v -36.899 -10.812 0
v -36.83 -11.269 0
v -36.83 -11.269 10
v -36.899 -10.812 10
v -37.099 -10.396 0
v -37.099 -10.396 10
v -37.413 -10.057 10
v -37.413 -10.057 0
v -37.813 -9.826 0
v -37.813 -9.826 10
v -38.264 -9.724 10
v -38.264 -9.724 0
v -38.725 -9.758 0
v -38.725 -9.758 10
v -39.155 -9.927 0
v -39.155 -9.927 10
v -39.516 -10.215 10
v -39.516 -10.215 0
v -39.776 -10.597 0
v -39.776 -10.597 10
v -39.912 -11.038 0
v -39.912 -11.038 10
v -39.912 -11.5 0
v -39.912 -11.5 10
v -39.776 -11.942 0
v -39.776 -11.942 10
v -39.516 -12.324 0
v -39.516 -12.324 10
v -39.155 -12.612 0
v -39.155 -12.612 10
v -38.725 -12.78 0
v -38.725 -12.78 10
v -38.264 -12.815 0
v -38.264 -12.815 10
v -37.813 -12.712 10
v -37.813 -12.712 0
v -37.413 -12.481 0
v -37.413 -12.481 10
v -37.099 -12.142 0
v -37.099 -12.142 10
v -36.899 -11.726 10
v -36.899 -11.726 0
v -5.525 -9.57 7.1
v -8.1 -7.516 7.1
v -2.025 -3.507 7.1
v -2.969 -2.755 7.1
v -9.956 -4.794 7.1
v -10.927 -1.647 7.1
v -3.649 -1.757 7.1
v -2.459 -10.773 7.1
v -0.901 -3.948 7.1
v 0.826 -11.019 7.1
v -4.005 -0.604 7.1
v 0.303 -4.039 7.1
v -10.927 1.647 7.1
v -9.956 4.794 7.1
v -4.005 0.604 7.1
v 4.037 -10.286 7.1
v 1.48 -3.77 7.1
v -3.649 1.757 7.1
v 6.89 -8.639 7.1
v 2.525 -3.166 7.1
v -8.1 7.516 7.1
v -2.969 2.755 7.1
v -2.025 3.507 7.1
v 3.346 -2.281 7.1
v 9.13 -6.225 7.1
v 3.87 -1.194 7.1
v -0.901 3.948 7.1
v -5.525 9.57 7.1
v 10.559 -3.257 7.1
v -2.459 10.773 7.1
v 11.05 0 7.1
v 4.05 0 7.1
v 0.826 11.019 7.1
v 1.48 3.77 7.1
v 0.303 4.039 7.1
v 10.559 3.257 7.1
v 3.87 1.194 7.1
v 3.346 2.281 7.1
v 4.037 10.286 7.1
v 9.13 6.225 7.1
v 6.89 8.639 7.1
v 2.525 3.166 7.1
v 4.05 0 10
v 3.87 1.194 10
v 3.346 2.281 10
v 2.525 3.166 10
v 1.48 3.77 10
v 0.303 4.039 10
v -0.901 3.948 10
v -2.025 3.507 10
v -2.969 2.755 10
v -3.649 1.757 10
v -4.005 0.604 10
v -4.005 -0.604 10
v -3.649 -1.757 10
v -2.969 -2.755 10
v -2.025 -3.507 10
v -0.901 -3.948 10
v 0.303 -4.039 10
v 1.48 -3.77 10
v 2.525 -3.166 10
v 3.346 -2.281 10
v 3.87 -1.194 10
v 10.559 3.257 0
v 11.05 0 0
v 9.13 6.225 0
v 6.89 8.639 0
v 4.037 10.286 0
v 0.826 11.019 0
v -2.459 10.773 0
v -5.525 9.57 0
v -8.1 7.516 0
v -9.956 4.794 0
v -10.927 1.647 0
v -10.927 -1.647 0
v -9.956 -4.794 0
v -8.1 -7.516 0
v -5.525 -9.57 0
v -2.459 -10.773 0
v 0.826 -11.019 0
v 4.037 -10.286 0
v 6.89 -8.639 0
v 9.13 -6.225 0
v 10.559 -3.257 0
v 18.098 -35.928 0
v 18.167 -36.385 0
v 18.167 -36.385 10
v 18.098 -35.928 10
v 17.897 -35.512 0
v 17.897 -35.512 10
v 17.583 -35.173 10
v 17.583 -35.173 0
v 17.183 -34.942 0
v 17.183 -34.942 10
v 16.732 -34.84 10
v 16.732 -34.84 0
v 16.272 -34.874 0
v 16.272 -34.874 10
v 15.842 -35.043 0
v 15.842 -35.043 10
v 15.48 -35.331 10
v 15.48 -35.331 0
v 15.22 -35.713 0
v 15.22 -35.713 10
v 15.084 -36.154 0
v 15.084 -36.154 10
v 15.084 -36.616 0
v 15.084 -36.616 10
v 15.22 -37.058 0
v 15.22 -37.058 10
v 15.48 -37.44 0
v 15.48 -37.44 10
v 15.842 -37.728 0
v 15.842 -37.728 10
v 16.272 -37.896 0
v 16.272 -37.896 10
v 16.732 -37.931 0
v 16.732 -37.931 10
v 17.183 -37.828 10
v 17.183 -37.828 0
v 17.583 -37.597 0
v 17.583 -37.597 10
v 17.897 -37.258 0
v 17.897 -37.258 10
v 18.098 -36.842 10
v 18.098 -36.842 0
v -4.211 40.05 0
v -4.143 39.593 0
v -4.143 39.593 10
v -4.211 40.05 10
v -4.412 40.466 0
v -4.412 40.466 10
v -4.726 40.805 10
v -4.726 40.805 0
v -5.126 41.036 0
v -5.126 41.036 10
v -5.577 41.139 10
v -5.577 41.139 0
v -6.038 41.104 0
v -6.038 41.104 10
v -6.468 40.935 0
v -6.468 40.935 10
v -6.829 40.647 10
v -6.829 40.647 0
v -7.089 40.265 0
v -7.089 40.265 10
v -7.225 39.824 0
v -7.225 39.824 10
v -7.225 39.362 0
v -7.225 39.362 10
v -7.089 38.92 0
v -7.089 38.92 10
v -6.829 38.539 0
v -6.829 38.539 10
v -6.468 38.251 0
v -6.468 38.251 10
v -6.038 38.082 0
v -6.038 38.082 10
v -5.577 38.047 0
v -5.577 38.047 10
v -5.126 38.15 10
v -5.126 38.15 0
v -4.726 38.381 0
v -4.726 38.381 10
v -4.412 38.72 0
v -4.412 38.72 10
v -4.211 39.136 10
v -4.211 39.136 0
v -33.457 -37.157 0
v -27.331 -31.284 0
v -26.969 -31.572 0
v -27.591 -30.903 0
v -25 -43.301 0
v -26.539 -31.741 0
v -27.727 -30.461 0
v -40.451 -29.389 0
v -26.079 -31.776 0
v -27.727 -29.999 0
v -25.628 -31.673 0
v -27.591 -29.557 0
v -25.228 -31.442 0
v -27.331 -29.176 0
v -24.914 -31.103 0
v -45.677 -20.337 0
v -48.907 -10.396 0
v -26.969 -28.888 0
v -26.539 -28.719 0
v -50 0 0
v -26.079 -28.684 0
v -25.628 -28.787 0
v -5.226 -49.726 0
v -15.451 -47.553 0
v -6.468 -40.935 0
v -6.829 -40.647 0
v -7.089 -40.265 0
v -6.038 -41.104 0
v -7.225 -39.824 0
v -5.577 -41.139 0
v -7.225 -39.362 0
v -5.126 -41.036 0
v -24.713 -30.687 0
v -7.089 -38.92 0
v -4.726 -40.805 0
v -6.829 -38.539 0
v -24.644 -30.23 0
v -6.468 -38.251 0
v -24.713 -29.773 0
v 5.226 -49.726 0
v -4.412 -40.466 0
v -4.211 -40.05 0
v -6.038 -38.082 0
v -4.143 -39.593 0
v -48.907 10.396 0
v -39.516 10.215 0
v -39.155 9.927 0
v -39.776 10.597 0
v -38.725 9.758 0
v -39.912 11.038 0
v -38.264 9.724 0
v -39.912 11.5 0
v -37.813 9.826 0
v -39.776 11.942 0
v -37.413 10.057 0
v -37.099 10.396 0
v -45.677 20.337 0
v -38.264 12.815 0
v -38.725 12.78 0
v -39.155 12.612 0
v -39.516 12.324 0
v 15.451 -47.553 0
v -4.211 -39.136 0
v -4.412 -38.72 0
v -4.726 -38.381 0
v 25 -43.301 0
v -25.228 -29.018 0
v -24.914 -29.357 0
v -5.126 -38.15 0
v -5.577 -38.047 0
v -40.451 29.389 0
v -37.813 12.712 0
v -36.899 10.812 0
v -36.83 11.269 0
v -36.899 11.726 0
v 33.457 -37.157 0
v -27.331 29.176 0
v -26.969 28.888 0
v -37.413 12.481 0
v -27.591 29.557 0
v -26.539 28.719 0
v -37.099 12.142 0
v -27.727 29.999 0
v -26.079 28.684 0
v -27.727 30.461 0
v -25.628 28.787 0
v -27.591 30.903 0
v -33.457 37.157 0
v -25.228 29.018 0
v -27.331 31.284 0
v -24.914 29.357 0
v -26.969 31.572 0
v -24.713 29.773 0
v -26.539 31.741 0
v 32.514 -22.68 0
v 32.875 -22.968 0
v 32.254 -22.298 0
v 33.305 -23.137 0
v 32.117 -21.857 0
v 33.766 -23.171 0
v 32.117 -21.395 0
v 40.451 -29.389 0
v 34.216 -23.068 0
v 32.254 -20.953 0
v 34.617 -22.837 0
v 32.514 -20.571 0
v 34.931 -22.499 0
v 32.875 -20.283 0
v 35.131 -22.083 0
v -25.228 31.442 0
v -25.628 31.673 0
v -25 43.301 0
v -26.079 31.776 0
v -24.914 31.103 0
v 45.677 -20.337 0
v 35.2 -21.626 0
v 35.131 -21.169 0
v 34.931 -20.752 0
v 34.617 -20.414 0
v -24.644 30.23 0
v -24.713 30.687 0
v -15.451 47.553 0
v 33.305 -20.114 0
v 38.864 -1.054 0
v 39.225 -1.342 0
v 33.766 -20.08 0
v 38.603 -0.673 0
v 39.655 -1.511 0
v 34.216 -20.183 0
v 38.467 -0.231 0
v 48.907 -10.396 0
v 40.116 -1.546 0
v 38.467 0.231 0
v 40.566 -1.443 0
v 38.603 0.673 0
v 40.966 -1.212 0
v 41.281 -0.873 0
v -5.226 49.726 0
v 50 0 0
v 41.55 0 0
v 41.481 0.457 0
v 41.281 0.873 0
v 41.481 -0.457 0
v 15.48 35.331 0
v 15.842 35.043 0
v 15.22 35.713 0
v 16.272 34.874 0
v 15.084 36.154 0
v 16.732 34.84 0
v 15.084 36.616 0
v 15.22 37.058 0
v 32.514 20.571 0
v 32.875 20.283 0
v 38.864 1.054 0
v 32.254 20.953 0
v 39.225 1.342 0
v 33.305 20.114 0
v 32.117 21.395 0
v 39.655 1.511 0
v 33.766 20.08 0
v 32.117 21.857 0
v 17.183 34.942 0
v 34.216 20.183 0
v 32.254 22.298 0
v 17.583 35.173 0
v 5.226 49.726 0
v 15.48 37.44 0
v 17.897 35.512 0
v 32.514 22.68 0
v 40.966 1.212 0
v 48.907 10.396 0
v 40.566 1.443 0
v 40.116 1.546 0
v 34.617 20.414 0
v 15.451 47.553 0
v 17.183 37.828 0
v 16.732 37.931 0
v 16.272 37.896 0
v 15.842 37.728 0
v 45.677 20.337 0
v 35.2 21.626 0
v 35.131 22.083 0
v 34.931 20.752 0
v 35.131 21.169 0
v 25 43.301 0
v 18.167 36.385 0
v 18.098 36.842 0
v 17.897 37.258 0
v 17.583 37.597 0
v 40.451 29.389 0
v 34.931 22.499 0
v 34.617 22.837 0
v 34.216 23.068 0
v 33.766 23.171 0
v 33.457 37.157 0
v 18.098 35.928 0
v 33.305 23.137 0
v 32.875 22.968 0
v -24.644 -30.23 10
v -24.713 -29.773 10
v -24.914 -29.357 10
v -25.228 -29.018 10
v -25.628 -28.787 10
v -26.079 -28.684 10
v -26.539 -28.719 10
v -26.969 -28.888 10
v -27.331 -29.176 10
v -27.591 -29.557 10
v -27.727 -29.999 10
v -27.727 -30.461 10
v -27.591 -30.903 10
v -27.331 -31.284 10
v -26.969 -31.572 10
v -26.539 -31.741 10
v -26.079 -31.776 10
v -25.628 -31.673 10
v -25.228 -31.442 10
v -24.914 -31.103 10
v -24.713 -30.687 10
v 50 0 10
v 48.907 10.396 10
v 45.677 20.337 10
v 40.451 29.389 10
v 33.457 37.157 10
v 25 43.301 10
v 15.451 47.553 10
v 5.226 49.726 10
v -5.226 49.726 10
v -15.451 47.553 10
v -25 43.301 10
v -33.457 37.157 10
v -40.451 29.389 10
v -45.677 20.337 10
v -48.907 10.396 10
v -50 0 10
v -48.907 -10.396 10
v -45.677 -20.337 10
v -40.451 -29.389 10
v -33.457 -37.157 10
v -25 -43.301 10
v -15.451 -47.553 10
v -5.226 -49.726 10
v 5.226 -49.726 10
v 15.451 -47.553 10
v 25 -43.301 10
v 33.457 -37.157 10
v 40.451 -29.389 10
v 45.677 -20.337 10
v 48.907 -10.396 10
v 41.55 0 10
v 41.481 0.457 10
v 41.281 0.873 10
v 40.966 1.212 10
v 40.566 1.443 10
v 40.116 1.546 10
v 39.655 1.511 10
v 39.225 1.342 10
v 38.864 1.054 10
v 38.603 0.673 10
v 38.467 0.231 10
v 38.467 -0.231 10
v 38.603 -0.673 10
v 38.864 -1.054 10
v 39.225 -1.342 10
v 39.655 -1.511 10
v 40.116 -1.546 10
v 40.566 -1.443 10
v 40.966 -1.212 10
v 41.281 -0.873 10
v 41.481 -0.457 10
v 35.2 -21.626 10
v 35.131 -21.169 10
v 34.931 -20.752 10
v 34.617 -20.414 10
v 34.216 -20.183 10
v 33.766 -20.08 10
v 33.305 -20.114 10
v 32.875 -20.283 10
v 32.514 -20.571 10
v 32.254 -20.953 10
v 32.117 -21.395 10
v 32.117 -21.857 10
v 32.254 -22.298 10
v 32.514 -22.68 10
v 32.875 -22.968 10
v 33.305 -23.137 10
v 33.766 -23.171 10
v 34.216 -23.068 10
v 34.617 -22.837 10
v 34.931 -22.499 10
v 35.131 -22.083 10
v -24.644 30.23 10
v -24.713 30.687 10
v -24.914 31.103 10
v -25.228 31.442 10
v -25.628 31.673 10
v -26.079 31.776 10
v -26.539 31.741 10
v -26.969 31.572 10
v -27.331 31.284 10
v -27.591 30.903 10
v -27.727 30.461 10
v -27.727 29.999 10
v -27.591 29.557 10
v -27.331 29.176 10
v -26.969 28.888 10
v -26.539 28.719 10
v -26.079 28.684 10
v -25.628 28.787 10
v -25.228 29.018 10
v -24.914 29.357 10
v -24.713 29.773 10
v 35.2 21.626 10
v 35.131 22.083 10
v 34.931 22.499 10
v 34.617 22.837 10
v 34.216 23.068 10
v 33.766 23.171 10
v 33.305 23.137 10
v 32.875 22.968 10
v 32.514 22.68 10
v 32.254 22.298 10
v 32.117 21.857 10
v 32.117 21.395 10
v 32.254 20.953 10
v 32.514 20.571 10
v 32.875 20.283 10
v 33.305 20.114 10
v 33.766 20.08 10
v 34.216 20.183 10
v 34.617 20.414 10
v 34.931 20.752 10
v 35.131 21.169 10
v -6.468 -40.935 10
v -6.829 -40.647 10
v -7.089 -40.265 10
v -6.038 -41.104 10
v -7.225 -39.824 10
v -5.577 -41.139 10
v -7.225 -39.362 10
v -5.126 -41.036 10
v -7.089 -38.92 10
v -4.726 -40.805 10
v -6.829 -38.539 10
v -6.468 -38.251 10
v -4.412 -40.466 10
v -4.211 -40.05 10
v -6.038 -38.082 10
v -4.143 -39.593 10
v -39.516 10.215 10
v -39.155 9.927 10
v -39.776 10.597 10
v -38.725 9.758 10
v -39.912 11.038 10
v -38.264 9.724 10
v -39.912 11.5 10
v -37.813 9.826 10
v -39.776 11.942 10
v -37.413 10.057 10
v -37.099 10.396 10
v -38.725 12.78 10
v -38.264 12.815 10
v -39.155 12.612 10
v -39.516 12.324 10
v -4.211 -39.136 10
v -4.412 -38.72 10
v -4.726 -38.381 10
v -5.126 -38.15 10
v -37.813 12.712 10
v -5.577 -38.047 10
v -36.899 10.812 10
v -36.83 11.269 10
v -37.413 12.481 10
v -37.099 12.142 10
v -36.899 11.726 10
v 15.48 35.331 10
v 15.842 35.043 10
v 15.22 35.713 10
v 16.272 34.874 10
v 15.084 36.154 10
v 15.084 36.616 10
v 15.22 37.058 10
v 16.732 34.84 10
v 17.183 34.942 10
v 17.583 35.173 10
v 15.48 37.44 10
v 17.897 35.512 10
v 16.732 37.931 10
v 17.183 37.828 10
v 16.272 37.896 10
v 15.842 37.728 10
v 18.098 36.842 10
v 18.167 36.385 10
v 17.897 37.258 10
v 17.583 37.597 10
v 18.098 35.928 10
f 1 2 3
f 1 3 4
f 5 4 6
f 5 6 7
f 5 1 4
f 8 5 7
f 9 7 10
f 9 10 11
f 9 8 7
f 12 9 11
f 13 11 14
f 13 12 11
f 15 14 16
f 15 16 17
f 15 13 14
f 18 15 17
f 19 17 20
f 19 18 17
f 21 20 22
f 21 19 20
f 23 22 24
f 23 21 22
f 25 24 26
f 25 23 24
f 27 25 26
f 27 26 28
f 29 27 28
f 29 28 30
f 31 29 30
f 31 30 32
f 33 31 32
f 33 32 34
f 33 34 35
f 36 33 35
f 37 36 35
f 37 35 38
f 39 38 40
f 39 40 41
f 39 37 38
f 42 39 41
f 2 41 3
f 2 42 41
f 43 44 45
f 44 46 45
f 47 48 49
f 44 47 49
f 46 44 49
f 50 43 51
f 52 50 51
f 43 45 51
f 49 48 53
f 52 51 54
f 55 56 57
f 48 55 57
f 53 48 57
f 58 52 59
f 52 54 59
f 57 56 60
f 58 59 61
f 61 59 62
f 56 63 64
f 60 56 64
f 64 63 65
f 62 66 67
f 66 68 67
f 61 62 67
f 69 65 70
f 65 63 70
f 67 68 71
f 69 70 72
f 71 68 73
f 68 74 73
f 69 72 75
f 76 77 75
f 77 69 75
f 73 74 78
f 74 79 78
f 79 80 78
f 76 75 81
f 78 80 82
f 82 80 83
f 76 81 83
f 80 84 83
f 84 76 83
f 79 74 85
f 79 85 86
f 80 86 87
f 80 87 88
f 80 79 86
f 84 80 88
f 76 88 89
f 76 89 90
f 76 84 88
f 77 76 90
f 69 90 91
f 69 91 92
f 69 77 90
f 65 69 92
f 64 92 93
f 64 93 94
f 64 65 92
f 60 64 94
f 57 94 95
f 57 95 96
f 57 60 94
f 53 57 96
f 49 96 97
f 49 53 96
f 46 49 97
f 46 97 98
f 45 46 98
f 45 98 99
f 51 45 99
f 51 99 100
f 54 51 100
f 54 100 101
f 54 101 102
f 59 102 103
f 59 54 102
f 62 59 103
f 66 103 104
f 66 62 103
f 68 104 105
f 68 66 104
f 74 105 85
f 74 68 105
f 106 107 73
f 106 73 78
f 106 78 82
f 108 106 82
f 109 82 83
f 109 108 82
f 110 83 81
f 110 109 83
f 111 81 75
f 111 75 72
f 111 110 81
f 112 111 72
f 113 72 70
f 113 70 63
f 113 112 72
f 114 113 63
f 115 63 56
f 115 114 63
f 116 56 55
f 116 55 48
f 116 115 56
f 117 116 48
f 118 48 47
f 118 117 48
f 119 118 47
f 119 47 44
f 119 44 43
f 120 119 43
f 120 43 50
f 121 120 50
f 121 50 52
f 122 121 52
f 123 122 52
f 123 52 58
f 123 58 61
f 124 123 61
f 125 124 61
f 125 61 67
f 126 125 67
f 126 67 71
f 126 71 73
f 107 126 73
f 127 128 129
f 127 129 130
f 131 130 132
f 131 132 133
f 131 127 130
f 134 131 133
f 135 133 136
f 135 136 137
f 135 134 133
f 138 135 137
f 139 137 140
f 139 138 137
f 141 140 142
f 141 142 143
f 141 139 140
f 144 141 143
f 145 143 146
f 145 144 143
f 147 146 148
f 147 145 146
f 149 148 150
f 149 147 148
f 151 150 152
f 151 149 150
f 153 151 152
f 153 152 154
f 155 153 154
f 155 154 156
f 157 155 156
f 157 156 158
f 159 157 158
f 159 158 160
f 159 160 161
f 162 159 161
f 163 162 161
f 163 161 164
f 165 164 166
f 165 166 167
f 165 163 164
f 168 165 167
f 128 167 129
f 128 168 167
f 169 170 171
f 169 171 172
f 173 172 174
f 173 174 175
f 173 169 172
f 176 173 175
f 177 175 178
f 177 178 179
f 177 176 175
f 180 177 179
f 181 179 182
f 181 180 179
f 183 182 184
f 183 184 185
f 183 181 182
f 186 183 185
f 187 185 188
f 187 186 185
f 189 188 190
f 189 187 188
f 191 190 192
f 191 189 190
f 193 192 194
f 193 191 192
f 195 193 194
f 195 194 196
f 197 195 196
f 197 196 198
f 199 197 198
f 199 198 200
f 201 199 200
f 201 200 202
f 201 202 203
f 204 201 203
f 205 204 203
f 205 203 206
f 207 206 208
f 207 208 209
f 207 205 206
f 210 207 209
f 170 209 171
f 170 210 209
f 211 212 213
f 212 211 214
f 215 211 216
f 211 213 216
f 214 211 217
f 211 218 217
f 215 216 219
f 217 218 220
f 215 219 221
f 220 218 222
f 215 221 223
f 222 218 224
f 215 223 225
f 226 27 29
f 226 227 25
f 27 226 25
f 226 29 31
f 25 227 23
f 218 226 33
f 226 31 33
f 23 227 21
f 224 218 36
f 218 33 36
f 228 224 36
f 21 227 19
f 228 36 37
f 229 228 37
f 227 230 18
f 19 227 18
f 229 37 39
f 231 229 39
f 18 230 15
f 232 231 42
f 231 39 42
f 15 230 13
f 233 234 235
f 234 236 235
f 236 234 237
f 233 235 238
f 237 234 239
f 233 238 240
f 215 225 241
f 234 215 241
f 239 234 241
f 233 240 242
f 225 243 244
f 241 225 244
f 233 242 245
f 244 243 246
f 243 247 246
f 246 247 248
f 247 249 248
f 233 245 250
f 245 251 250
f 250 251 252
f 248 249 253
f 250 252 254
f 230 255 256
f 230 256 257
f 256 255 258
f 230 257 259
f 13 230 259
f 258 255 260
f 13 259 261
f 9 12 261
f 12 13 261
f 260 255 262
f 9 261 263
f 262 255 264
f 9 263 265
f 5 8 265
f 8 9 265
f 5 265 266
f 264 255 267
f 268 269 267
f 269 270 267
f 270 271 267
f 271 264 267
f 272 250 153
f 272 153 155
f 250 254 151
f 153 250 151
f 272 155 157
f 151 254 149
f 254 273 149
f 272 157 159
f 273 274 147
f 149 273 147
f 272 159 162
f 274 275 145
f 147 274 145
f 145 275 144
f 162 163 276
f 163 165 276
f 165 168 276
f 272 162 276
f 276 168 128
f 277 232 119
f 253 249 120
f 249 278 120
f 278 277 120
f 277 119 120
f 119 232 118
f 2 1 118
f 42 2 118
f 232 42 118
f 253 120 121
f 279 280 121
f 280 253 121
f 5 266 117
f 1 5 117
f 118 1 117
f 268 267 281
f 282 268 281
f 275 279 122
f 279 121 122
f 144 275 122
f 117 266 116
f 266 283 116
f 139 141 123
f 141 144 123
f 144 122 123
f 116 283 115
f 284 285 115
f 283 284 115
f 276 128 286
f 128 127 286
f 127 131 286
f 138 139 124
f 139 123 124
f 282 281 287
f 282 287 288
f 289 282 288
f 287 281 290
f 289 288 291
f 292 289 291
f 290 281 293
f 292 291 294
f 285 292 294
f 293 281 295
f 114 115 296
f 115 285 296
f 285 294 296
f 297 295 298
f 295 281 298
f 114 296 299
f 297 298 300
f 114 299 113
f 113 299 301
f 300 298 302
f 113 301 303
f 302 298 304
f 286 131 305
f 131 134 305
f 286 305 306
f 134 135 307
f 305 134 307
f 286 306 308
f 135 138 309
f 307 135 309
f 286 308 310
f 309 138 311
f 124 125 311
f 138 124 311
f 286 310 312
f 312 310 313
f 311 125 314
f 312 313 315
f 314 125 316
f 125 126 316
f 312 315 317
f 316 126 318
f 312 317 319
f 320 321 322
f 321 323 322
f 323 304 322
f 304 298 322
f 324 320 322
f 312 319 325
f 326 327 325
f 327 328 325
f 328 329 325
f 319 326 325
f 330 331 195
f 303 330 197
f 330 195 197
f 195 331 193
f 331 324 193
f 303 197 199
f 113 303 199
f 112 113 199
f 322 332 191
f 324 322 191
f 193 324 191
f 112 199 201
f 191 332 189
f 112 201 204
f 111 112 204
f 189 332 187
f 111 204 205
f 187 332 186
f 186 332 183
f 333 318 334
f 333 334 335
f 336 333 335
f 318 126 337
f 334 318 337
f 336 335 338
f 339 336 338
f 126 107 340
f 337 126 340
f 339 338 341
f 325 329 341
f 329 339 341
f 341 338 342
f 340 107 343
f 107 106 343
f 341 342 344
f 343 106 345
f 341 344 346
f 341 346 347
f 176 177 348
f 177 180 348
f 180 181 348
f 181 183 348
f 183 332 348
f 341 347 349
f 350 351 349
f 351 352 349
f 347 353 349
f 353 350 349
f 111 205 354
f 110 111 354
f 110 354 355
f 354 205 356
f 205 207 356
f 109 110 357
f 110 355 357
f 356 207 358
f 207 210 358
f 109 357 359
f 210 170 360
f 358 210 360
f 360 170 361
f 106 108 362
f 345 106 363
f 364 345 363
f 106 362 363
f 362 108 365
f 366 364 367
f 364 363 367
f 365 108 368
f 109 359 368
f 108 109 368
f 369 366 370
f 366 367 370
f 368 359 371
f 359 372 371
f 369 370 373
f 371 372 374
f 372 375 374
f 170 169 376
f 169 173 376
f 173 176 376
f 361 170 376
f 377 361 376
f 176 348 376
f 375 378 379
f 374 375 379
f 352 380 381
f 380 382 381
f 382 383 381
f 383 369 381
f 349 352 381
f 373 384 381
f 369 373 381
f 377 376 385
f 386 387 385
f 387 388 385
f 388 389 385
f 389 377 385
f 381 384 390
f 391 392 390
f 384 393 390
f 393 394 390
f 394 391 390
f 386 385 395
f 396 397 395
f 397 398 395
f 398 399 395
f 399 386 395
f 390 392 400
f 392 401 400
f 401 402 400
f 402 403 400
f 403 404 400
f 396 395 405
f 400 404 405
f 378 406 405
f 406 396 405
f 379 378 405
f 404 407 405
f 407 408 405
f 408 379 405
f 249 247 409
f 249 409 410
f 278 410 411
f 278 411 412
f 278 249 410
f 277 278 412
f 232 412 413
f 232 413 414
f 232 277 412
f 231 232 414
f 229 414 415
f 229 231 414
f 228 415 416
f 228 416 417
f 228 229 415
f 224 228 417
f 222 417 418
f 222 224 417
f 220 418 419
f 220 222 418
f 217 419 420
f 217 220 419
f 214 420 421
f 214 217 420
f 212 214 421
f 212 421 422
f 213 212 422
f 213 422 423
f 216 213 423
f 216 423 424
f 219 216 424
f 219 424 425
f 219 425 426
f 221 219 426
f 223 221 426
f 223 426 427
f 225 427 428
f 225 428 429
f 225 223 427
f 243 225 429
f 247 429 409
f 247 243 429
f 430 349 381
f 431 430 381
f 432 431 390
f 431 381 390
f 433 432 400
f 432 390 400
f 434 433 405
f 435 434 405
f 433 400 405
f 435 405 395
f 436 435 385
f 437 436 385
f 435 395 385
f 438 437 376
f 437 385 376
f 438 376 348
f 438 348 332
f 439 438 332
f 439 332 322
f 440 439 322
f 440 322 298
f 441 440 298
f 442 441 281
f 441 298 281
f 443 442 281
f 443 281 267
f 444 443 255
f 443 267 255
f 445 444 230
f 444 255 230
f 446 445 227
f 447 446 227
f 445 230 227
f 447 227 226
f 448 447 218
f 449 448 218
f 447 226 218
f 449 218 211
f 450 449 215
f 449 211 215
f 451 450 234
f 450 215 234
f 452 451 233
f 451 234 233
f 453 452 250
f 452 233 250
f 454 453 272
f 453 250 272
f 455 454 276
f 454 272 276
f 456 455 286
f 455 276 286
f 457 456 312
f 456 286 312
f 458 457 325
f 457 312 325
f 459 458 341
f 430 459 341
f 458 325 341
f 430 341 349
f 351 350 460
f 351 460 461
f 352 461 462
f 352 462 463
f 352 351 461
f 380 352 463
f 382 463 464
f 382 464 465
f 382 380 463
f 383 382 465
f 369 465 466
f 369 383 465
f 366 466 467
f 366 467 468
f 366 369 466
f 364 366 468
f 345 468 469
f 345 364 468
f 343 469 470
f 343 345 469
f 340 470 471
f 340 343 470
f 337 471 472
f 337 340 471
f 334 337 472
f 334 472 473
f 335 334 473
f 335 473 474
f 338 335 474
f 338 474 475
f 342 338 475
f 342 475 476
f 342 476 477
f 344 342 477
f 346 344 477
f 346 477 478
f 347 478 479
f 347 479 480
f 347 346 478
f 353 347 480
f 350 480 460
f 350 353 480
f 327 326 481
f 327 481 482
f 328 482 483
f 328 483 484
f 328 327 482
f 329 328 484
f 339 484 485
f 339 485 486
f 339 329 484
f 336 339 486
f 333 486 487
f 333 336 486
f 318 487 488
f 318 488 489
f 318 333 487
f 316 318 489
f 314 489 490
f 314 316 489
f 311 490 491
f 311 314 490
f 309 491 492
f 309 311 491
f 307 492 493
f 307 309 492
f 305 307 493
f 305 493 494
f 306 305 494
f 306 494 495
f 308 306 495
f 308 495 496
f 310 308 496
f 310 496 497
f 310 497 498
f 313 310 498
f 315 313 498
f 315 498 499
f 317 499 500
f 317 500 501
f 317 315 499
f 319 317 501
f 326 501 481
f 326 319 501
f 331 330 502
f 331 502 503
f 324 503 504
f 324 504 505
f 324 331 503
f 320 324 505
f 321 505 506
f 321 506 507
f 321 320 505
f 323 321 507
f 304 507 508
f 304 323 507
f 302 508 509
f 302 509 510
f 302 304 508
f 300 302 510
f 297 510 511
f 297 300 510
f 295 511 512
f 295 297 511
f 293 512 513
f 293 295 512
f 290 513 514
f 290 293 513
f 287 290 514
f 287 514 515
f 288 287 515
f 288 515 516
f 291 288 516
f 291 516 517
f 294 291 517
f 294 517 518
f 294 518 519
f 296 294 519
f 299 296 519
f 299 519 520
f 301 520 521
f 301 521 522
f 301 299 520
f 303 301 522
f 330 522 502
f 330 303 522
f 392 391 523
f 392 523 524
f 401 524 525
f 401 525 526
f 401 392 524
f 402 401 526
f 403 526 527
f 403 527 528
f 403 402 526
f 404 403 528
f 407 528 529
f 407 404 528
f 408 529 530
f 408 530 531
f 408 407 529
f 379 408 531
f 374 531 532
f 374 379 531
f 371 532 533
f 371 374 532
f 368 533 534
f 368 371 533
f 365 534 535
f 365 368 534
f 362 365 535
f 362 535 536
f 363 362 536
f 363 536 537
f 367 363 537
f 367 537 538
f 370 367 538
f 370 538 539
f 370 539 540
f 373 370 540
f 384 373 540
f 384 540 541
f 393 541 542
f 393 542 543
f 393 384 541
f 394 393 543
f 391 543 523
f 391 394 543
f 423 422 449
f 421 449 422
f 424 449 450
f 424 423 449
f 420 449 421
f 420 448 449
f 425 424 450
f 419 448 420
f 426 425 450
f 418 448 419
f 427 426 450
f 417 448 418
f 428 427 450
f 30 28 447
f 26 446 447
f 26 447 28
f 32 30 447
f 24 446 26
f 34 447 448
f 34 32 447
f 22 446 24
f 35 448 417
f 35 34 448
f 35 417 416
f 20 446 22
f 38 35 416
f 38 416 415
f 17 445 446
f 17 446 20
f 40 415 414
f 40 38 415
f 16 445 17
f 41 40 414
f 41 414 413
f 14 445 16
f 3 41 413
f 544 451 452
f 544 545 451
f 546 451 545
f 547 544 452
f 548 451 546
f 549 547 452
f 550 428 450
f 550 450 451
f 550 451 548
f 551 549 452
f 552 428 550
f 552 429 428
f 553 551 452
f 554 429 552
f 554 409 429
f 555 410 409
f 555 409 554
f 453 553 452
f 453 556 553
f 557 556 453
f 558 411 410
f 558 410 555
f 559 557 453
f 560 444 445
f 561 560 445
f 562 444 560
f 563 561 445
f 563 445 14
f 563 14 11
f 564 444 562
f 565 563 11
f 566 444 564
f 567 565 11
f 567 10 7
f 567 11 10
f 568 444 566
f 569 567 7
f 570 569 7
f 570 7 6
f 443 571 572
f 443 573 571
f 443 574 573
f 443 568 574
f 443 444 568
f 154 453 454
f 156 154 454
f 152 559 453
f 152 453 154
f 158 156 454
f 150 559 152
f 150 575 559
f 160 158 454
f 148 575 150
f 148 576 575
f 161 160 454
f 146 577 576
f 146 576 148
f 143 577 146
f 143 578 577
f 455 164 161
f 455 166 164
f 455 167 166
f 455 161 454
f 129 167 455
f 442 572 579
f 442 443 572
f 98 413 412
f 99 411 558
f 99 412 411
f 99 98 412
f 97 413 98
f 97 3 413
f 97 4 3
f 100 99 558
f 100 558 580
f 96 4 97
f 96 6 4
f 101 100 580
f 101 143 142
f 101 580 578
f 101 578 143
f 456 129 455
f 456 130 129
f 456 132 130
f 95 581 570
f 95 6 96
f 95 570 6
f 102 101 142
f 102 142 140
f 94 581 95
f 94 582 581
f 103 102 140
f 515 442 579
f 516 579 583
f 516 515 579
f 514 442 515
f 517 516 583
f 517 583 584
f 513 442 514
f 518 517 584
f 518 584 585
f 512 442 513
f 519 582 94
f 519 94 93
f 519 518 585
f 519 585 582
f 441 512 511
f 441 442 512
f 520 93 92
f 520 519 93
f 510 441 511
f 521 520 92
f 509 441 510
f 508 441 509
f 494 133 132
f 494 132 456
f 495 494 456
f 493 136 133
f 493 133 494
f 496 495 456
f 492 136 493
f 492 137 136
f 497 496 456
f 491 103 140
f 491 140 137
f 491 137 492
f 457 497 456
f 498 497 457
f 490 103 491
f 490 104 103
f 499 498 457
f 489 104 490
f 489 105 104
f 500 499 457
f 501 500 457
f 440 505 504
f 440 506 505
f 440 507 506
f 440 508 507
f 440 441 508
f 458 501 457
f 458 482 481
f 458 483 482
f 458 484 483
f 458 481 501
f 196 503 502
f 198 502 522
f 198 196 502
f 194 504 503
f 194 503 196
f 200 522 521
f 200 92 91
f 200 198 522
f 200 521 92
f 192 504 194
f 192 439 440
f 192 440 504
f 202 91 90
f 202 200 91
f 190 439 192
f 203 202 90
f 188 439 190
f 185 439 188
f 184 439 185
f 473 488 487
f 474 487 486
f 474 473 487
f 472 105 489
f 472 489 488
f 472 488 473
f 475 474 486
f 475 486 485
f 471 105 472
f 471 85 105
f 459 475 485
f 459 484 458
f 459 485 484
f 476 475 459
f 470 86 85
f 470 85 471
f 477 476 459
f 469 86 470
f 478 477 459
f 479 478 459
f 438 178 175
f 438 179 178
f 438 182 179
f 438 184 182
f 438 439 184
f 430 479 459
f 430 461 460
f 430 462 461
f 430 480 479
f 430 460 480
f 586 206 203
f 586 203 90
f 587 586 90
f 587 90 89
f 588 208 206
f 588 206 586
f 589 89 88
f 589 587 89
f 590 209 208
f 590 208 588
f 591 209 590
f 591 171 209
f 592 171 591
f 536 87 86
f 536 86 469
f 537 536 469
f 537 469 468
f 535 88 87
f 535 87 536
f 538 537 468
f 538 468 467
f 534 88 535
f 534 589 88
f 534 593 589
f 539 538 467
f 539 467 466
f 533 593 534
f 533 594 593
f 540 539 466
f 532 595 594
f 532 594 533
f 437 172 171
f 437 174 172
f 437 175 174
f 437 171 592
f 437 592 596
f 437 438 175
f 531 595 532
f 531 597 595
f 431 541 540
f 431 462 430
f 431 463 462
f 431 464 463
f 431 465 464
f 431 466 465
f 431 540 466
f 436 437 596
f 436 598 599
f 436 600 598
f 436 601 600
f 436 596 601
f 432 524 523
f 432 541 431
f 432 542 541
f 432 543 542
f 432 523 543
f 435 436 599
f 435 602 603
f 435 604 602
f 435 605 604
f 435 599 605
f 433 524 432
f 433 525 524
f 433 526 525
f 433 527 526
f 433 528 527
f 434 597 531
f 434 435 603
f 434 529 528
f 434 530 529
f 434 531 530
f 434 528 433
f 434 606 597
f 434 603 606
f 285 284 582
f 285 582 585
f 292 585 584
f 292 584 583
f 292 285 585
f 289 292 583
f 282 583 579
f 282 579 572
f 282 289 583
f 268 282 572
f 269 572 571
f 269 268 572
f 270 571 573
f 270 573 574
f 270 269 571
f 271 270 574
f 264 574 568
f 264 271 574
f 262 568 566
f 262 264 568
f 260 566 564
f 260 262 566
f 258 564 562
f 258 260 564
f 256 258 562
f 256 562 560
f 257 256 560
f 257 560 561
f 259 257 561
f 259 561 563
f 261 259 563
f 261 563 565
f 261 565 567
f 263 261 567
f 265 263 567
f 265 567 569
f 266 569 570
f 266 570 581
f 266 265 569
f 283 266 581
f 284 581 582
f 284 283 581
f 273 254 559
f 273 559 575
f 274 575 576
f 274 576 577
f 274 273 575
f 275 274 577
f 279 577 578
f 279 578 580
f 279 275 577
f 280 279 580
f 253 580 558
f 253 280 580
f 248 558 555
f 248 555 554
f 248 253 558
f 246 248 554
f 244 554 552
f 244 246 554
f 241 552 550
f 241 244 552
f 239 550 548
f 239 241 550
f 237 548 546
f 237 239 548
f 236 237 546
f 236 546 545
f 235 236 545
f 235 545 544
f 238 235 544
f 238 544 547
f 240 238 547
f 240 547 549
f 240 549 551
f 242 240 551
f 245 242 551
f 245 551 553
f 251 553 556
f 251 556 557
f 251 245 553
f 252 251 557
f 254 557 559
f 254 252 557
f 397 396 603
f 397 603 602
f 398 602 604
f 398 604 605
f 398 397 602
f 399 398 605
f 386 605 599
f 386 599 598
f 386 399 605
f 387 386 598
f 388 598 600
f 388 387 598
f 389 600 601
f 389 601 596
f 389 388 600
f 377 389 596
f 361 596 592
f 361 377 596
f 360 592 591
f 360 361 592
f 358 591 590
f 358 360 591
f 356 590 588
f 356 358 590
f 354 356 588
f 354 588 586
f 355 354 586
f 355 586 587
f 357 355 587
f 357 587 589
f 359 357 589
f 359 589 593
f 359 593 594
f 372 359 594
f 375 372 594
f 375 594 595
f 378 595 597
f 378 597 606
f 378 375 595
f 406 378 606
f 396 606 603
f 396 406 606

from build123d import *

# Parameters (mm, degrees)
SKETCH1_R           = 50
SKETCH1_R_2         = 11.05
SKETCH1_R_3         = 1.55
BOSS_EXTRUDE1_DEPTH = 10
BOSS_EXTRUDE2_START = -2.9
SKETCH2_R           = 11.05
SKETCH2_R_2         = 4.05
BOSS_EXTRUDE2_DEPTH = 2.9


with BuildPart() as part:
    # Sketch1 → Boss-Extrude1 (new body)
    with BuildSketch(Plane.XY):
        Circle(SKETCH1_R)
        Circle(SKETCH1_R_2, mode=Mode.SUBTRACT)
        with Locations((40, 0)):
            Circle(SKETCH1_R_3, mode=Mode.SUBTRACT)
        with Locations((33.650141313, -21.625632698)):
            Circle(SKETCH1_R_3, mode=Mode.SUBTRACT)
        with Locations((16.61660052, -36.385279814)):
            Circle(SKETCH1_R_3, mode=Mode.SUBTRACT)
        with Locations((-5.692593531, -39.592857675)):
            Circle(SKETCH1_R_3, mode=Mode.SUBTRACT)
        with Locations((-26.194429358, -30.229982974)):
            Circle(SKETCH1_R_3, mode=Mode.SUBTRACT)
        with Locations((-38.379718945, -11.269302274)):
            Circle(SKETCH1_R_3, mode=Mode.SUBTRACT)
        with Locations((-38.379718945, 11.269302274)):
            Circle(SKETCH1_R_3, mode=Mode.SUBTRACT)
        with Locations((-26.194429358, 30.229982974)):
            Circle(SKETCH1_R_3, mode=Mode.SUBTRACT)
        with Locations((-5.692593531, 39.592857675)):
            Circle(SKETCH1_R_3, mode=Mode.SUBTRACT)
        with Locations((16.61660052, 36.385279814)):
            Circle(SKETCH1_R_3, mode=Mode.SUBTRACT)
        with Locations((33.650141313, 21.625632698)):
            Circle(SKETCH1_R_3, mode=Mode.SUBTRACT)
    extrude(amount=BOSS_EXTRUDE1_DEPTH)

    # Sketch2 → Boss-Extrude2 (add)
    with BuildSketch(Plane.XY.offset(10).offset(BOSS_EXTRUDE2_START)):
        Circle(SKETCH2_R)
        Circle(SKETCH2_R_2, mode=Mode.SUBTRACT)
    extrude(amount=BOSS_EXTRUDE2_DEPTH)


solid = part.part
